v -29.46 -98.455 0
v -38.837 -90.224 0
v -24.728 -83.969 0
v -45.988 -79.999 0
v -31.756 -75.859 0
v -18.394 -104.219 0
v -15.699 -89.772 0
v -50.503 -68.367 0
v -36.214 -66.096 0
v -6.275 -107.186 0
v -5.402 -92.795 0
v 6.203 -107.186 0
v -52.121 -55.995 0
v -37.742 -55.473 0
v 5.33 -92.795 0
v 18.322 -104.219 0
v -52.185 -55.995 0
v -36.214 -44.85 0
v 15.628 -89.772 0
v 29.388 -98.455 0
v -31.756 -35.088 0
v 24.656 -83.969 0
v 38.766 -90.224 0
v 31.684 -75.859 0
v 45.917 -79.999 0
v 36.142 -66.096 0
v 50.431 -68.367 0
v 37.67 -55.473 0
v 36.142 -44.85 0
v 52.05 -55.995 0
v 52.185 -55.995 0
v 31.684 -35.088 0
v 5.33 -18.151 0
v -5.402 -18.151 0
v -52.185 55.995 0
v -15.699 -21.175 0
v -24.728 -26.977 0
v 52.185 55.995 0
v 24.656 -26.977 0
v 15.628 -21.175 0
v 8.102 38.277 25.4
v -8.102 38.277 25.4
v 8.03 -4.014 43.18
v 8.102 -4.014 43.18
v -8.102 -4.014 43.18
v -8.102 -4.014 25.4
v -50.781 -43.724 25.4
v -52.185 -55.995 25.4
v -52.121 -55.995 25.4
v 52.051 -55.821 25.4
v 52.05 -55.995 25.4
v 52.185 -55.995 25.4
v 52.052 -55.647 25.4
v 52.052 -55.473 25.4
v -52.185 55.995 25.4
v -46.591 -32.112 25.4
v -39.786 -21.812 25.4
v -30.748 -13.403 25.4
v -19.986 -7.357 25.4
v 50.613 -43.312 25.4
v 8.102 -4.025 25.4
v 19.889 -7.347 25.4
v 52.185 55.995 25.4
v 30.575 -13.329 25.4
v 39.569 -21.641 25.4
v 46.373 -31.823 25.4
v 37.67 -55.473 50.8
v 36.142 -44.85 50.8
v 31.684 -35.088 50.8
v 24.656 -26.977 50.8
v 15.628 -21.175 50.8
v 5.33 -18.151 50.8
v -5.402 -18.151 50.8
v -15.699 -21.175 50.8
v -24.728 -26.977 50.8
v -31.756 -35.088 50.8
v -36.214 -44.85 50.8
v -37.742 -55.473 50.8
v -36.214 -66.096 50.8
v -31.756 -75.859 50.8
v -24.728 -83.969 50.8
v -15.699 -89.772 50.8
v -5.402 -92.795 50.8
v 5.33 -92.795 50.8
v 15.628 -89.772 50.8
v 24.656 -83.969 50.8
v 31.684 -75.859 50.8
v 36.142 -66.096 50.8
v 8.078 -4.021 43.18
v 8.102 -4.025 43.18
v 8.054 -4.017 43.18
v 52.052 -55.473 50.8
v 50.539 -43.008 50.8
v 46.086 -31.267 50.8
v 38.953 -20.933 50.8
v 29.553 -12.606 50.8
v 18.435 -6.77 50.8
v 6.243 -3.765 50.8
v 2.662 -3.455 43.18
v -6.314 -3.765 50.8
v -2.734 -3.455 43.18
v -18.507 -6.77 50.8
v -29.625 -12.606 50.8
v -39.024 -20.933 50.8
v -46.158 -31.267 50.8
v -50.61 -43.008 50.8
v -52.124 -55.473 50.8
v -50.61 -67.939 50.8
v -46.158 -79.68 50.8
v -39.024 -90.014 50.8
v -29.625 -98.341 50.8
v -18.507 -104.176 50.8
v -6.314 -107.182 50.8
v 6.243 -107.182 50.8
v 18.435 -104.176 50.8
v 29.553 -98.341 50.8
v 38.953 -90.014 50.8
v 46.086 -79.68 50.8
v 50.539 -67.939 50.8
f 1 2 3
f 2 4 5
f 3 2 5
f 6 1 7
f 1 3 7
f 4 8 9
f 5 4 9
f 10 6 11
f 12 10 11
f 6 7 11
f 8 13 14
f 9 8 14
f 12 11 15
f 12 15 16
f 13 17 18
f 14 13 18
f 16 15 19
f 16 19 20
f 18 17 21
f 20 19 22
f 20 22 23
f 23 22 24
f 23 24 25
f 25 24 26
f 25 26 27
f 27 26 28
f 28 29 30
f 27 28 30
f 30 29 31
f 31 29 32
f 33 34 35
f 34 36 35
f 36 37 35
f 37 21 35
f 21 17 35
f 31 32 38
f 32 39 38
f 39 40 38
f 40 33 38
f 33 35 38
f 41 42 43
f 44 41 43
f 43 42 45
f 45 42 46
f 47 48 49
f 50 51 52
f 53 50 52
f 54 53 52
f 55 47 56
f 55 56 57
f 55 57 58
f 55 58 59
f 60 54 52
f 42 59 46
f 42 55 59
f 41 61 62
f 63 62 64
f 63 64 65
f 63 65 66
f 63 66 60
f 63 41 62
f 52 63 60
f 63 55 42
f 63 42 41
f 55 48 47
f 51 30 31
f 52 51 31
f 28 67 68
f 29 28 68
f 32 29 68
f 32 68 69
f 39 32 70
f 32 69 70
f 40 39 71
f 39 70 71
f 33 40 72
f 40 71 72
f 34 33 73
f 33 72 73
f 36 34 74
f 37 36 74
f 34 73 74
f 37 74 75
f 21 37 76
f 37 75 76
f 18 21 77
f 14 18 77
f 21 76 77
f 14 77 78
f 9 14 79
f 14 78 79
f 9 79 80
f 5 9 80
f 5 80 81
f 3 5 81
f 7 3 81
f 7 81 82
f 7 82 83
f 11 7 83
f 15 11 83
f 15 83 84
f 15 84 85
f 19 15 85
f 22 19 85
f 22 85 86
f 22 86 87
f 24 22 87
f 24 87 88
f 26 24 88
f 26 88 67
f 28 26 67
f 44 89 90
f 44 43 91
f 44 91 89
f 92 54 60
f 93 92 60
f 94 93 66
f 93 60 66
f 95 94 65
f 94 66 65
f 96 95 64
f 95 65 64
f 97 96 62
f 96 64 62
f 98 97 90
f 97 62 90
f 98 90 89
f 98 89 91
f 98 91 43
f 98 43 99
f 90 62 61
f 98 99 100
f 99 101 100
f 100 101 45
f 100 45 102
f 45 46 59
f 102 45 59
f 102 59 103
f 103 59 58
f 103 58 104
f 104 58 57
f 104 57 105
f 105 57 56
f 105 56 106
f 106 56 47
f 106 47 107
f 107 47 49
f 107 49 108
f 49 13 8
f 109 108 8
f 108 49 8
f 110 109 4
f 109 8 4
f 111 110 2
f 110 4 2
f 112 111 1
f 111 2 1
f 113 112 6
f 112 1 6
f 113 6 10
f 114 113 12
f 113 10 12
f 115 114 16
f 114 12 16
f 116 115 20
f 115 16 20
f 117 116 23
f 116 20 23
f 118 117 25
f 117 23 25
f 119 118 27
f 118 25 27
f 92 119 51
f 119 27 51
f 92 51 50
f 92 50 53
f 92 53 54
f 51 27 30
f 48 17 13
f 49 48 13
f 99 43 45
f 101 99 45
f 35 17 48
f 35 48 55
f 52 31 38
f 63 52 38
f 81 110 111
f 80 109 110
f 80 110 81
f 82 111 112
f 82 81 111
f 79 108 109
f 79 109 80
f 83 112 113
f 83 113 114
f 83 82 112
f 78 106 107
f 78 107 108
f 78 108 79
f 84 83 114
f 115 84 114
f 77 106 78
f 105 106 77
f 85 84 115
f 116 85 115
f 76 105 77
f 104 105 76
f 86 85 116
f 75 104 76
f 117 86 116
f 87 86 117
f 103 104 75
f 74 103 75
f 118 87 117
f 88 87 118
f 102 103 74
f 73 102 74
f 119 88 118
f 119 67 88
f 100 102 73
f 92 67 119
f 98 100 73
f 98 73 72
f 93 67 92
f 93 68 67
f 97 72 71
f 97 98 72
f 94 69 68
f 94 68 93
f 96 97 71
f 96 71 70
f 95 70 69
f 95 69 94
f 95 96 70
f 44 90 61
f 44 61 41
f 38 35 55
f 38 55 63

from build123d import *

# Parameters (mm, degrees)
F0_W     = 104.370906
F0_H     = 111.990906
F2_DEPTH = 25.4
F1_R     = 52.088044
F3_DEPTH = 50.8
F4_R     = 37.70573
F5_DEPTH = 50.801
F7_DEPTH = 17.78
F9_DEPTH = 60.288576


with BuildPart() as f2:
    # F0 (on Top) → F2 (new body)
    with BuildSketch(Plane.XY):
        Rectangle(F0_W, F0_H)
    extrude(amount=F2_DEPTH)

    # F1 (on Top) → F3 (join)
    with BuildSketch(Plane.XY):
        with Locations((-0.035915, -55.473275)):
            Circle(F1_R)
    extrude(amount=F3_DEPTH)

    # F4 (on face) → F5 (cut, through all)
    with BuildSketch(Plane.XY.offset(50.8)):
        with Locations((-0.035915, -55.473275)):
            Circle(F4_R)
    extrude(amount=-F5_DEPTH, mode=Mode.SUBTRACT)

    # F6 (on face) → F7 (join)
    with BuildSketch(Plane.XY.offset(25.4)):
        with BuildLine():
            ThreePointArc((-8.102123, -4.013576), (0.000443, -3.385244), (8.102123, -4.024887))
            Line((8.102123, -4.024887), (8.102123, 38.277184))
            Line((8.102123, 38.277184), (-8.102123, 38.277184))
            Line((-8.102123, 38.277184), (-8.102123, -4.013576))
        make_face()
    extrude(amount=F7_DEPTH)

    # F8 (on face) → F9 (cut, through all)
    with BuildSketch(Plane(origin=(-8.102123, 0, 0), x_dir=(0, -1, 0), z_dir=(-1, 0, 0))):
        Polygon((-38.277184, 43.18), (-38.277184, 25.4), (4.013576, 43.18), align=None)
    extrude(amount=-F9_DEPTH, mode=Mode.SUBTRACT)


solid = f2.part
